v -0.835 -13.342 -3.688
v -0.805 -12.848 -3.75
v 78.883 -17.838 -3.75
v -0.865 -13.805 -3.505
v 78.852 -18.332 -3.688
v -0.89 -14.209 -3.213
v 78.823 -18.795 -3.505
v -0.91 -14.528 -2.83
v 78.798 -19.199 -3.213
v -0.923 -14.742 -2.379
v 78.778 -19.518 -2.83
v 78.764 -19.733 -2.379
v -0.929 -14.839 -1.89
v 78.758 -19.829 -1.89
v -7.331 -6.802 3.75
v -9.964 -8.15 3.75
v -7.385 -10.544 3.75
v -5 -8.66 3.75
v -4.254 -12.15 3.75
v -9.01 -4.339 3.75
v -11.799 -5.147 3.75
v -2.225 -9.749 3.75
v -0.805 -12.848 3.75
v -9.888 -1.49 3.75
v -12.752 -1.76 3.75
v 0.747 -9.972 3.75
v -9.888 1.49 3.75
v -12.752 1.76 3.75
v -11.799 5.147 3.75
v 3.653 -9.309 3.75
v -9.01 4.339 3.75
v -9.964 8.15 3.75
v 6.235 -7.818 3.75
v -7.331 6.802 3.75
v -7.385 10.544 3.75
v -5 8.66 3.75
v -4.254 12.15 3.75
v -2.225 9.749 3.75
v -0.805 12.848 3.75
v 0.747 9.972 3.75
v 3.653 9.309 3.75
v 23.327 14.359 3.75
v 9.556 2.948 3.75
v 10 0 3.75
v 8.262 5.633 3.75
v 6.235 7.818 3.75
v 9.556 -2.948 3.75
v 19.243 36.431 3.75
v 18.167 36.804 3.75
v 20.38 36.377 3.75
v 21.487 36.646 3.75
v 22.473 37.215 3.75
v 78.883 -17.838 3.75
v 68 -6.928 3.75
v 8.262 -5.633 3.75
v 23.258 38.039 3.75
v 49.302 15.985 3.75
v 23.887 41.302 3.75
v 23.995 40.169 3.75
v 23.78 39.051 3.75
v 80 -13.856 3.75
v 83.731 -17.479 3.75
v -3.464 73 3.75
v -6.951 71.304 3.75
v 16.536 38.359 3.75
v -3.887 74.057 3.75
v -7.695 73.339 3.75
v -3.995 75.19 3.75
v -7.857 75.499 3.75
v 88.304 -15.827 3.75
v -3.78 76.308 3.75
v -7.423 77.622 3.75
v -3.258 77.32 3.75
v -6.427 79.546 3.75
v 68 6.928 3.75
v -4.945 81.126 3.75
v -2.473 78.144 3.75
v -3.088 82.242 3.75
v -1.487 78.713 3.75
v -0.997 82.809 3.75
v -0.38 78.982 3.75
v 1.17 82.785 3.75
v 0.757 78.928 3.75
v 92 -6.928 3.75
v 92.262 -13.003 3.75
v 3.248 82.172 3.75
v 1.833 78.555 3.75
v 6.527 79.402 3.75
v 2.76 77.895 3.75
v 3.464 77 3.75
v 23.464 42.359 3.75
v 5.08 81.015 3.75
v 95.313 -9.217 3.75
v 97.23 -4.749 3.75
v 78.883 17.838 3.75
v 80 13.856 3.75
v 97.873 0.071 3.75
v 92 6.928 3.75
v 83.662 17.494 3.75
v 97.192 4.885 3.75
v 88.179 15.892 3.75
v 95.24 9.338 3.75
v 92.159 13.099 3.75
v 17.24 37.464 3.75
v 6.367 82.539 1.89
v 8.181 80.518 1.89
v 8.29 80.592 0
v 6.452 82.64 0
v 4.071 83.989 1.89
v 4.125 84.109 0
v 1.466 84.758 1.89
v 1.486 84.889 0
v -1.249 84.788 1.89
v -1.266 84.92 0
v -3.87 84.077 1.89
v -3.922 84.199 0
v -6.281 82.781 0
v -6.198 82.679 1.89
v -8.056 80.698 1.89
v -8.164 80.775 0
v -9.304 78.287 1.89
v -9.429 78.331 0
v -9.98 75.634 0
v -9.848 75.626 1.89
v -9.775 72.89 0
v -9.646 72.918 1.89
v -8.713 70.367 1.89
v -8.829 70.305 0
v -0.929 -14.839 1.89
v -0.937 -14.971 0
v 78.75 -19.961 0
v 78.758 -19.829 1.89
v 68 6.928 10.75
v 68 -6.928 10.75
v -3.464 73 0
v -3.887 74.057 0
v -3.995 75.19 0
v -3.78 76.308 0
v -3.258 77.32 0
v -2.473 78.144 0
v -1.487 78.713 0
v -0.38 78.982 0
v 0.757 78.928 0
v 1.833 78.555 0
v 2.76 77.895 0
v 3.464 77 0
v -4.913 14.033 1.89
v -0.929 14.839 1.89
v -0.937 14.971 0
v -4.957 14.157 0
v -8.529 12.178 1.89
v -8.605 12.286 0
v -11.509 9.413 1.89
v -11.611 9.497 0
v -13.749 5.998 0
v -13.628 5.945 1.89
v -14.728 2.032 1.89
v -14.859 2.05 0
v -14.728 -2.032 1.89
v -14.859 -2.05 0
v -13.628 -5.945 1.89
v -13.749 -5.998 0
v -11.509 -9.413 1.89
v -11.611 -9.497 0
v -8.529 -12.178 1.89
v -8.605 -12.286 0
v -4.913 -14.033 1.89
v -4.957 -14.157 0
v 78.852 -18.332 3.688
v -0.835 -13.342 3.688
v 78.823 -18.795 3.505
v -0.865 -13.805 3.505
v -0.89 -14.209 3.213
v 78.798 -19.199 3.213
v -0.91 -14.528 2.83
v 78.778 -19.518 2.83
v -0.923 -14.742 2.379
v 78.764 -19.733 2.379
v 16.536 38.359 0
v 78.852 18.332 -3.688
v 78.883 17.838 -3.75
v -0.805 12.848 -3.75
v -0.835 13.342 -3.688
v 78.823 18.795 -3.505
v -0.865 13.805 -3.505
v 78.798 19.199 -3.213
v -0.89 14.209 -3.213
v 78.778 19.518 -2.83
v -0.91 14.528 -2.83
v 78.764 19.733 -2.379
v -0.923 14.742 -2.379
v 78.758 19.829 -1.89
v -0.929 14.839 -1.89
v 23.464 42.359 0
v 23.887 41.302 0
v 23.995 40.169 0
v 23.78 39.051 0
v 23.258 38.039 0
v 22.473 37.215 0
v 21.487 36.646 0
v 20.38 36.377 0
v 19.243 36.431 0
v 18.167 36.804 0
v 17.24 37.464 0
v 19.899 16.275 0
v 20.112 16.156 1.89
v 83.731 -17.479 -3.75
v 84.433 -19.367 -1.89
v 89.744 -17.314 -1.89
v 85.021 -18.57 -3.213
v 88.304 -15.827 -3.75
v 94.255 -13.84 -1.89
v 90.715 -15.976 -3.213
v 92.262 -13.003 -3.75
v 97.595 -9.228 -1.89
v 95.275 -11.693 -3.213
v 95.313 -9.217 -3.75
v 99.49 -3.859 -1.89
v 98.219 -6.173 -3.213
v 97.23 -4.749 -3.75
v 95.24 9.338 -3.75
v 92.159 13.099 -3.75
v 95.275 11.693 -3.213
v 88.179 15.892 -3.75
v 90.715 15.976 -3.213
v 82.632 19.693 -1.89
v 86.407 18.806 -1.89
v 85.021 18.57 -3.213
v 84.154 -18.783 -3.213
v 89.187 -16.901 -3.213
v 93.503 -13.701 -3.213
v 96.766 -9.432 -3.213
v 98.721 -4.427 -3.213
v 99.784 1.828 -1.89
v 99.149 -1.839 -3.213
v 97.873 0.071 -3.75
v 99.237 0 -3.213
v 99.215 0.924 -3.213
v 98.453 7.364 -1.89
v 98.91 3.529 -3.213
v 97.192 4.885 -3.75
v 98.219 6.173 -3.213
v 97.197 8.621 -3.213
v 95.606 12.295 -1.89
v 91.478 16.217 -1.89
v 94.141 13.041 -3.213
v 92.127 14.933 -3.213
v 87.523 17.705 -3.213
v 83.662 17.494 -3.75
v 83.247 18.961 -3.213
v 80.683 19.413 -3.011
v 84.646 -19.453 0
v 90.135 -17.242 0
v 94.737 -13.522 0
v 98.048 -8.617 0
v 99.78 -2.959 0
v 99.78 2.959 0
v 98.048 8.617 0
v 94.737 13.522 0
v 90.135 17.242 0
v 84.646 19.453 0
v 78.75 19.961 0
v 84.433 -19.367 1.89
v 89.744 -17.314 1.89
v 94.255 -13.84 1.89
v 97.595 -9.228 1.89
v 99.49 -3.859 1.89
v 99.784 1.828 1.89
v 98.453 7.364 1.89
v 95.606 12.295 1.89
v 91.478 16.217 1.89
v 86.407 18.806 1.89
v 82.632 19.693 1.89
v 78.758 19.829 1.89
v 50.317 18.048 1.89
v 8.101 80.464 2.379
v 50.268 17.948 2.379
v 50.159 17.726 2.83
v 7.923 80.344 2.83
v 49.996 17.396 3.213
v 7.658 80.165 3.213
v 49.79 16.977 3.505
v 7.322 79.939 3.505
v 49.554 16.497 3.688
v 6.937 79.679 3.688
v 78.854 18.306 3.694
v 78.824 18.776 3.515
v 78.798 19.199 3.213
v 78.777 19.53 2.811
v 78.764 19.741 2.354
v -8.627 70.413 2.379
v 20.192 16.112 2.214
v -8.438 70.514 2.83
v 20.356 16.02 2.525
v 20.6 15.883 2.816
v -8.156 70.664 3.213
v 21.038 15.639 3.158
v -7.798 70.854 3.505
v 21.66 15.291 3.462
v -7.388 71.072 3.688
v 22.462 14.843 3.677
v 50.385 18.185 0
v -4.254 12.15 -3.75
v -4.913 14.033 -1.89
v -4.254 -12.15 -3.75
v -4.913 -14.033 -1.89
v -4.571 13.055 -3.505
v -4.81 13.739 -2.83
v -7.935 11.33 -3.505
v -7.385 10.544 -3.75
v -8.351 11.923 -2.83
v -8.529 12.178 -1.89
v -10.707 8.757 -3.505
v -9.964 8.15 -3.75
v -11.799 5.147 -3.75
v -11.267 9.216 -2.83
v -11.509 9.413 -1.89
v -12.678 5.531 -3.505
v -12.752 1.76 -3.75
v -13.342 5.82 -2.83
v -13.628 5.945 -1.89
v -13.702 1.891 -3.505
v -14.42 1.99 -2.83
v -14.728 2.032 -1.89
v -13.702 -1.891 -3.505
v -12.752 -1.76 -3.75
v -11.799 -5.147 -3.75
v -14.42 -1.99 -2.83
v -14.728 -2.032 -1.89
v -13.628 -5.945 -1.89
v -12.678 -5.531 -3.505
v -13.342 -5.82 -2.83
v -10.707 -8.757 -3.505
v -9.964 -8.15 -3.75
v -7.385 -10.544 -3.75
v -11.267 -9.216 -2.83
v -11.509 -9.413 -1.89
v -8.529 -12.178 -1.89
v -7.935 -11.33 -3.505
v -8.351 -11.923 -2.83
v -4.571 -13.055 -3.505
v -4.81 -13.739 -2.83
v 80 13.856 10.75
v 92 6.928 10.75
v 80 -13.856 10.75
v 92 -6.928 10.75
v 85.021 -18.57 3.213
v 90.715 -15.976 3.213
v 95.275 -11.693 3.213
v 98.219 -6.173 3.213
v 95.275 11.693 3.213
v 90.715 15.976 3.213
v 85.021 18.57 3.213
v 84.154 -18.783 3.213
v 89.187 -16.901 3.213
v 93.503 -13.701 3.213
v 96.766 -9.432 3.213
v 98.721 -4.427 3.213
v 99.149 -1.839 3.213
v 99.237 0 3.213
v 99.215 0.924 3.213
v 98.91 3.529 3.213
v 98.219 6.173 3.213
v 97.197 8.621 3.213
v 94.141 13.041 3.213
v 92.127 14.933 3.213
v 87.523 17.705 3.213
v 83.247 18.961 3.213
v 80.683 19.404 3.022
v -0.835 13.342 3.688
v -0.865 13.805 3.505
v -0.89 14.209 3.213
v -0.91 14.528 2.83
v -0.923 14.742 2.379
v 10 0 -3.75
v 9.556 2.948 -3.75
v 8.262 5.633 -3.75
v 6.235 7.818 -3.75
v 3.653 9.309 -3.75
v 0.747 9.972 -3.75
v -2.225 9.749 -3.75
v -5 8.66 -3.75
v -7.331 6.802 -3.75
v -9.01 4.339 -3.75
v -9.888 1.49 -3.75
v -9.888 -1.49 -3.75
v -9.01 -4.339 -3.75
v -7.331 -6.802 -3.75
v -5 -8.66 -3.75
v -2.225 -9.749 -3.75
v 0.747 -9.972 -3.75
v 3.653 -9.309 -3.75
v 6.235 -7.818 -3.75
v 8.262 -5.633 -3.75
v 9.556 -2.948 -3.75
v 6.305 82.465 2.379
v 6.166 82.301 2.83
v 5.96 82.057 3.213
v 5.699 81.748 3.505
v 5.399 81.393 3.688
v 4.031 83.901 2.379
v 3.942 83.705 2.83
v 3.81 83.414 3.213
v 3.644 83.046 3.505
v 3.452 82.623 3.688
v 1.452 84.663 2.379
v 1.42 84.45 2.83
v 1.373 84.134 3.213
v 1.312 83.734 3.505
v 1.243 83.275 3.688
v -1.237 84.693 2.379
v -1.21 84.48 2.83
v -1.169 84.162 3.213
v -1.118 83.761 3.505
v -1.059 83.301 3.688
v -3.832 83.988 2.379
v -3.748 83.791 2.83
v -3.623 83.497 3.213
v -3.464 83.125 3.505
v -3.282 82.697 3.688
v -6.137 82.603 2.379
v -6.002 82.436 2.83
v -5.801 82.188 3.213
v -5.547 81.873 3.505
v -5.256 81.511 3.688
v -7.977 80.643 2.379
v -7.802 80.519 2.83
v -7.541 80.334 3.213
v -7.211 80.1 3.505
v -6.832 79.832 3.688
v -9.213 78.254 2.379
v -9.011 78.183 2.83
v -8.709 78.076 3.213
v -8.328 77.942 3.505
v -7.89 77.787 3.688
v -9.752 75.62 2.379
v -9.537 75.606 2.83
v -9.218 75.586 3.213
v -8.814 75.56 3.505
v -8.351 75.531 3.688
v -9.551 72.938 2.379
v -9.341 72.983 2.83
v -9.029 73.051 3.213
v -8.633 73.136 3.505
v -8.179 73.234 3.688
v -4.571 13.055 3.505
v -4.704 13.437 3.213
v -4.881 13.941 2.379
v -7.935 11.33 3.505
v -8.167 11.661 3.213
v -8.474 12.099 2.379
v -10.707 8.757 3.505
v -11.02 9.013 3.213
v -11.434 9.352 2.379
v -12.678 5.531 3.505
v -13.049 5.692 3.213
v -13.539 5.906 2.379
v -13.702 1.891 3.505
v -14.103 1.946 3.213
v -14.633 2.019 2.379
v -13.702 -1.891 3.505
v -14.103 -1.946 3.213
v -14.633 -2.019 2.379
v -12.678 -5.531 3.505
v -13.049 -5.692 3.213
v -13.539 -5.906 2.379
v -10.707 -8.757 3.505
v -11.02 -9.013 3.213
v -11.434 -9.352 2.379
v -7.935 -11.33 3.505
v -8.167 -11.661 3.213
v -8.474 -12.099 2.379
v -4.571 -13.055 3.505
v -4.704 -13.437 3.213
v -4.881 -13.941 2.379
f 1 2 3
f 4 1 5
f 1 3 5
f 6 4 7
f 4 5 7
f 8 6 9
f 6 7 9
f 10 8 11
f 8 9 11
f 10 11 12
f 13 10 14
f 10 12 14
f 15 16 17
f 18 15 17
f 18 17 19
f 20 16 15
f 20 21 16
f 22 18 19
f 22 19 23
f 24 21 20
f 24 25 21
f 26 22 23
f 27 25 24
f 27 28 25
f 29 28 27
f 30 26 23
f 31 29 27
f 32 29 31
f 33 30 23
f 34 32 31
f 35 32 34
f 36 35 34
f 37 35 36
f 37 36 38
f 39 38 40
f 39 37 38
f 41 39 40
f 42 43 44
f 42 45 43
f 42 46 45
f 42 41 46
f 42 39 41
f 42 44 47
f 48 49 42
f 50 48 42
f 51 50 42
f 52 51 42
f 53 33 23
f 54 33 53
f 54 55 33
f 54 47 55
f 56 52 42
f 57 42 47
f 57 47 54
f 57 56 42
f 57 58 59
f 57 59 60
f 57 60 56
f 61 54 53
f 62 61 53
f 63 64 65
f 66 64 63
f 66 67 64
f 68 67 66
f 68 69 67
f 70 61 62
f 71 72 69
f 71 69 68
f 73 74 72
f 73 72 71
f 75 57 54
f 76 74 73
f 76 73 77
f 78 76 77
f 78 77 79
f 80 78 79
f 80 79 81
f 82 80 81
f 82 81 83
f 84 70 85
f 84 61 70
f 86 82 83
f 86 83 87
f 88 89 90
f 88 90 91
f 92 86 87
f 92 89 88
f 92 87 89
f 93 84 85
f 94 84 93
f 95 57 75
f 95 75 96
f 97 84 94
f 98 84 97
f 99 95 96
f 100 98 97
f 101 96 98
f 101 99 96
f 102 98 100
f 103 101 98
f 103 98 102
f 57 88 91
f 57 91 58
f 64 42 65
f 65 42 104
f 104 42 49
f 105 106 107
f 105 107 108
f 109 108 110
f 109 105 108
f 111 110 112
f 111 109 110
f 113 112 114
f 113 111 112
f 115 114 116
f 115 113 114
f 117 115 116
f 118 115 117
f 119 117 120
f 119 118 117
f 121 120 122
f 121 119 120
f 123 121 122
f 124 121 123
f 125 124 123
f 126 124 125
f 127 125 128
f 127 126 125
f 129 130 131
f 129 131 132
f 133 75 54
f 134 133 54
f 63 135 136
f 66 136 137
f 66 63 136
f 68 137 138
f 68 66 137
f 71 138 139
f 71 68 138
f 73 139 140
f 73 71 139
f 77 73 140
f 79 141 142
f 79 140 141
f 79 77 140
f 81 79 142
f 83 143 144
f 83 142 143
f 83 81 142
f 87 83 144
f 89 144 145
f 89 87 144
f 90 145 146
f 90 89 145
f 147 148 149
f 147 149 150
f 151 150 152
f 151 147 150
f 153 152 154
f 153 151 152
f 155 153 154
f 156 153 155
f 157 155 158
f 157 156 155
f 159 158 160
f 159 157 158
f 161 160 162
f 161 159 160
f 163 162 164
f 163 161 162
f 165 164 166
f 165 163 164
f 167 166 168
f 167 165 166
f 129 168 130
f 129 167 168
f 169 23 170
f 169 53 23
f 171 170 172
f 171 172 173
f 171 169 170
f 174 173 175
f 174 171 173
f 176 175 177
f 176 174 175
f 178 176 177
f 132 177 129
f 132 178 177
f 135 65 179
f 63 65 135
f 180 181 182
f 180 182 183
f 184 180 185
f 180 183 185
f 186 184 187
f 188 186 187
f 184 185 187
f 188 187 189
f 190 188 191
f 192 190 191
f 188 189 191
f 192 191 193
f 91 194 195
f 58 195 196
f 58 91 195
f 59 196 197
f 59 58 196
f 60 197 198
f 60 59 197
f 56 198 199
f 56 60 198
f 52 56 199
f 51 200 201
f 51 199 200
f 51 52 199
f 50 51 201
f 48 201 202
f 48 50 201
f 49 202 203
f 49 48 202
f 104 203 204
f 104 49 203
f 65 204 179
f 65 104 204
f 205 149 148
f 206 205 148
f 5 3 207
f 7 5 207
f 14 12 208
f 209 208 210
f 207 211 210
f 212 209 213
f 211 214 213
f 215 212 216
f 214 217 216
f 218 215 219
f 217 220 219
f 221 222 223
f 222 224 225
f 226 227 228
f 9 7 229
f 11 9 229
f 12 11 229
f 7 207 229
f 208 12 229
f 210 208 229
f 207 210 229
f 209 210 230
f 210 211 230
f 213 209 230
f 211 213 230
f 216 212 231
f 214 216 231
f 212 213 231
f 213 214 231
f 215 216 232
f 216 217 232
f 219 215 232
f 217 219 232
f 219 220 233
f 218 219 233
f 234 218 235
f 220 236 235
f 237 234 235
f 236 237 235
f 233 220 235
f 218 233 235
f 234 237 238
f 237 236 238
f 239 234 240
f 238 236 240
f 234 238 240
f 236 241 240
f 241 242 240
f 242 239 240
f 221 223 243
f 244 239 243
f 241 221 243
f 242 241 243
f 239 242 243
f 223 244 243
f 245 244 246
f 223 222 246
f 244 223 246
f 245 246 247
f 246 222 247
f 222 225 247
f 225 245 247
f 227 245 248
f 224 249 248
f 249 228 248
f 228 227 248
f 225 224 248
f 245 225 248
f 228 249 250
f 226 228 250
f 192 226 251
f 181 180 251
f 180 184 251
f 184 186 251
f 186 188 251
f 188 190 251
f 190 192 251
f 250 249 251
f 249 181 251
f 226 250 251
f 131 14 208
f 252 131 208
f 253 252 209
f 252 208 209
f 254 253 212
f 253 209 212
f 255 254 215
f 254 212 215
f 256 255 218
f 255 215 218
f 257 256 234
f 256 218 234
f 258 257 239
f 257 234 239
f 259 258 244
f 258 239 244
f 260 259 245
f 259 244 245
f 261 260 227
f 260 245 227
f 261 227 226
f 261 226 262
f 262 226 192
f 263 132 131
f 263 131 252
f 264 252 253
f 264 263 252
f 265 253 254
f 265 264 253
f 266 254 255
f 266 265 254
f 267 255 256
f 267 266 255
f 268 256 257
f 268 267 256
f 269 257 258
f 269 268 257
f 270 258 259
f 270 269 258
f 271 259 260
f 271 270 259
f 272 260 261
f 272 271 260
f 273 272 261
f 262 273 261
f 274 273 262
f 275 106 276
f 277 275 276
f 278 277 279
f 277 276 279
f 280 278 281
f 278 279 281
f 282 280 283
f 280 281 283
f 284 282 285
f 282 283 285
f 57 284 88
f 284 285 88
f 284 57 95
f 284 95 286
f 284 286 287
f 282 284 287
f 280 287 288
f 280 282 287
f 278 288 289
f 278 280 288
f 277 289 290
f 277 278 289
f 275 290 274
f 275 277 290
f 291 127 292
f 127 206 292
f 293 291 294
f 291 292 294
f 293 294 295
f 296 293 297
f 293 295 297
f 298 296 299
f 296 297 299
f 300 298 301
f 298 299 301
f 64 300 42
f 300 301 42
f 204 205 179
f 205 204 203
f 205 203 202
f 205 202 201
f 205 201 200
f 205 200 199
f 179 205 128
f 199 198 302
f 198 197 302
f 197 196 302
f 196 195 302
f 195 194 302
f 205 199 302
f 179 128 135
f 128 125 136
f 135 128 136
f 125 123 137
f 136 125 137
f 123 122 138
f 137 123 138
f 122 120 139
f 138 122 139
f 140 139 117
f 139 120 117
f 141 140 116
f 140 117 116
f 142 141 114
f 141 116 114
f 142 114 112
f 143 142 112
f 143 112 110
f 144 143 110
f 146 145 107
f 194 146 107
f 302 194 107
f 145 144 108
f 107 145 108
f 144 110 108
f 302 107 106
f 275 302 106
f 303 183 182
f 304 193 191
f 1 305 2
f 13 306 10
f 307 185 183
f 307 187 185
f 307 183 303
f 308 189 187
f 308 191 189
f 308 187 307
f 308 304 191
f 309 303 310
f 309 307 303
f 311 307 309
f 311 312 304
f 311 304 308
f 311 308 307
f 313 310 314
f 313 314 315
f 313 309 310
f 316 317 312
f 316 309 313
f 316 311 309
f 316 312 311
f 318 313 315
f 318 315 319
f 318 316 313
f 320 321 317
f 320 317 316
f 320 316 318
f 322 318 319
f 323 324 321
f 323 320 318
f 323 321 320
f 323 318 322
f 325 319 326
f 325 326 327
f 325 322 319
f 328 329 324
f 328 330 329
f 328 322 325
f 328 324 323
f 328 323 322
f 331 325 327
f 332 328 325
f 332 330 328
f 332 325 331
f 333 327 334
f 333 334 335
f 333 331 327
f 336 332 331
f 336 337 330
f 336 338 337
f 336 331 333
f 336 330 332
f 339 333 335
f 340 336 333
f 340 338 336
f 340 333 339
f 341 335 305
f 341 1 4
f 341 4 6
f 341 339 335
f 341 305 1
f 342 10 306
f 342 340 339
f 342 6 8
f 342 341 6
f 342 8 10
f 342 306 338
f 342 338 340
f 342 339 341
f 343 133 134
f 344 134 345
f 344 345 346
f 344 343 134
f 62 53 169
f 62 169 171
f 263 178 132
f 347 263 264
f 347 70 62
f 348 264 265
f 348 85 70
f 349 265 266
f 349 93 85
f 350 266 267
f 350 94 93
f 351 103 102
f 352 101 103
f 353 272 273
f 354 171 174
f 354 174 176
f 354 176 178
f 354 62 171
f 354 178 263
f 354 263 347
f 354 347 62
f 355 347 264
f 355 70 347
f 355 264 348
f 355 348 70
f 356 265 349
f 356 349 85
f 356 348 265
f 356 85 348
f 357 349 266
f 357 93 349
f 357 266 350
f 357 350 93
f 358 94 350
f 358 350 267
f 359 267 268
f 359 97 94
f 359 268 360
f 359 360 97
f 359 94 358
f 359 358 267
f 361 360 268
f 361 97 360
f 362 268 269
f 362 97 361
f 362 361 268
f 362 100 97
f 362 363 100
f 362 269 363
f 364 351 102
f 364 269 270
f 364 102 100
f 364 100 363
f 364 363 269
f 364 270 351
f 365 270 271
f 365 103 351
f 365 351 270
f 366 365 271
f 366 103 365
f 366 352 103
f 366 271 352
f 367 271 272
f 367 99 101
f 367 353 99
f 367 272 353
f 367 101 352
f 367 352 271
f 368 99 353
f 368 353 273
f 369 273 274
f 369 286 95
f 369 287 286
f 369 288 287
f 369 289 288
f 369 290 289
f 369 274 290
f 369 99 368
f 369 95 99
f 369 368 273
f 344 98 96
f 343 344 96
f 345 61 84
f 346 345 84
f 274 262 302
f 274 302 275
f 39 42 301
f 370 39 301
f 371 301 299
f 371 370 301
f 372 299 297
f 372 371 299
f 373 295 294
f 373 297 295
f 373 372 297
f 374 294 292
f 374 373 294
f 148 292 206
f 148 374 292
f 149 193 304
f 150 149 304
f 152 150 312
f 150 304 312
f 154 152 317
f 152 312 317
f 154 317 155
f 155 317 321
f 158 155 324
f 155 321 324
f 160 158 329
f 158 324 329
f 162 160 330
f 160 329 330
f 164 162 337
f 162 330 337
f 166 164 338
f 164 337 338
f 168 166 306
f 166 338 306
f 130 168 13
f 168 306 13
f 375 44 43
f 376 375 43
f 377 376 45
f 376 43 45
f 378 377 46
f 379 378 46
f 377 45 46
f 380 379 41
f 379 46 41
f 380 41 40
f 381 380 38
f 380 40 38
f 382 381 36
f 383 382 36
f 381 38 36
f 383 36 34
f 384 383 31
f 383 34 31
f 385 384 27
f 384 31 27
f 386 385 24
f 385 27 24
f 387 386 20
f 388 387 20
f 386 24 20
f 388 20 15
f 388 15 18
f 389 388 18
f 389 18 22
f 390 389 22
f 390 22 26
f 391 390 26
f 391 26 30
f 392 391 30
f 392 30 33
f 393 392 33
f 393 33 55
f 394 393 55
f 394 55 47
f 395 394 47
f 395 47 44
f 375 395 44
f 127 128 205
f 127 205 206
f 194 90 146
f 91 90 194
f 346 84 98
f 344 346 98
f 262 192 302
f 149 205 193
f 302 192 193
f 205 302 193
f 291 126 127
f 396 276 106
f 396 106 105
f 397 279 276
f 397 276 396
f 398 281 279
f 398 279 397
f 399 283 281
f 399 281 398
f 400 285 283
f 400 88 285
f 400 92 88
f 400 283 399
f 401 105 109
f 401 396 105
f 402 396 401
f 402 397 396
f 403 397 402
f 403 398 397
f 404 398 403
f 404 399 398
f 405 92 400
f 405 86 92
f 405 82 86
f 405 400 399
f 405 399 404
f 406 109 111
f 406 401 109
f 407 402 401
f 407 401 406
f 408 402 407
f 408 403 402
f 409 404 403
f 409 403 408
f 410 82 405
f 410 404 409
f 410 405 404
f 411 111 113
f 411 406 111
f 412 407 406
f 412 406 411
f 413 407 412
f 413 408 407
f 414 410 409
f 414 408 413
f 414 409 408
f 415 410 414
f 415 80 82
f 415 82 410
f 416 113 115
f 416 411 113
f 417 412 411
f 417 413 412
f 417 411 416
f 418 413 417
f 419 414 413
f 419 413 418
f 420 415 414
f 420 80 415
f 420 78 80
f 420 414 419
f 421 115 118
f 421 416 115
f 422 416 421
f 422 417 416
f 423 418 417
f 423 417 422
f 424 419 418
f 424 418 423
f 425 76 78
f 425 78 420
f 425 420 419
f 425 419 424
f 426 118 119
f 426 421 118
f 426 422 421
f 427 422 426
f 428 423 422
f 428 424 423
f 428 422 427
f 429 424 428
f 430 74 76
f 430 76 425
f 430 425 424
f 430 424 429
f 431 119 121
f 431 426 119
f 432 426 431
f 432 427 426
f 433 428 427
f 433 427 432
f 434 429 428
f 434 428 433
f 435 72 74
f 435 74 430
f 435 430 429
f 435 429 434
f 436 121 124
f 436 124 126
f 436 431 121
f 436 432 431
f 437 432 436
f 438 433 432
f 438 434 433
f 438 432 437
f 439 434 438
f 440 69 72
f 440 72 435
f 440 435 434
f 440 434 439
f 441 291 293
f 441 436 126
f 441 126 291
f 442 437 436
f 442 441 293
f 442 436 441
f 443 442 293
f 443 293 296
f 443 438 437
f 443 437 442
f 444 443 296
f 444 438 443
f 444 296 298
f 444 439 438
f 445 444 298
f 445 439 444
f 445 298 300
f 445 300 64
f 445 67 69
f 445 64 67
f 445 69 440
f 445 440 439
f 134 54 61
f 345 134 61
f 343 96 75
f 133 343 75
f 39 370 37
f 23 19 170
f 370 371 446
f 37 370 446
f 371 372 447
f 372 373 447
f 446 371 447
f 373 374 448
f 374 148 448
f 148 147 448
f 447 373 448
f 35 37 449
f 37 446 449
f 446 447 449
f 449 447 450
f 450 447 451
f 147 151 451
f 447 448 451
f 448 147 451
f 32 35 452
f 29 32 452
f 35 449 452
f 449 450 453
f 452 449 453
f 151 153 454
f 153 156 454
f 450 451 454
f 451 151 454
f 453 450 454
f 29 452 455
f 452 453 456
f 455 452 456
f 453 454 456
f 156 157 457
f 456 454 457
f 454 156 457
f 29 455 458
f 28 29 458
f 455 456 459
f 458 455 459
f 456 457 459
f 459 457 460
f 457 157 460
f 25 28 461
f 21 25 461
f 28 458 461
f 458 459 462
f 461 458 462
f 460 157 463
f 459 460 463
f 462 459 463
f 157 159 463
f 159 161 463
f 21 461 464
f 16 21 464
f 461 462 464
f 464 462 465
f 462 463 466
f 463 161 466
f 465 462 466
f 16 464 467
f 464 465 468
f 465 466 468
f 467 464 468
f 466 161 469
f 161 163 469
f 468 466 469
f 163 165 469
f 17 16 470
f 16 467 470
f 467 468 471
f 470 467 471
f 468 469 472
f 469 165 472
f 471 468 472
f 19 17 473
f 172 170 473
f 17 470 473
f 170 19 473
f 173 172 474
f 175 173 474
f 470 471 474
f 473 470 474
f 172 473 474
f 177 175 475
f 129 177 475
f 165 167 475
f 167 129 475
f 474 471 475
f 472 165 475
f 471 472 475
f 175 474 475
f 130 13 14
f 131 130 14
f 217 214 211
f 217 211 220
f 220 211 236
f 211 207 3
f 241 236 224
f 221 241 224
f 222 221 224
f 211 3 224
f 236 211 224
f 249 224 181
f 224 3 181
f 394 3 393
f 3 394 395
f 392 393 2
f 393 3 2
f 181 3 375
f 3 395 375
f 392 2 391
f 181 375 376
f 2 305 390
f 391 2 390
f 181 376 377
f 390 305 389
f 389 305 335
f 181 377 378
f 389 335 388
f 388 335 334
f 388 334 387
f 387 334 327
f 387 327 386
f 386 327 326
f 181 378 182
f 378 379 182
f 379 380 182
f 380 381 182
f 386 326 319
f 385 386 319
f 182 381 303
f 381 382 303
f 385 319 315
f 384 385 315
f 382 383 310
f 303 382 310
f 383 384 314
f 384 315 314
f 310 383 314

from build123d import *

# Parameters (mm, degrees)
EXTRUDE_366_DEPTH           = 3.75
EXTRUDE_366_TAPER           = 4.000000000000009
EXTRUDE_366_OTHER_WAY_DEPTH = 3.75
EXTRUDE_366_OTHER_WAY_TAPER = 4.000000000000009
EXTRUDE_746_DEPTH           = 3.75
EXTRUDE_746_TAPER           = 4.000000000000009
CUT_EXTRUDE_1239_DEPTH      = 10
SKETCH_4_R                  = 10
CUT_EXTRUDE_1_DEPTH         = 10
EXTRUDE_1783_DEPTH          = 7
FILLET_2_R                  = 2
FILLET_3_R                  = 2


with BuildPart() as part:
    # Эскиз1 → Extrude 366 (new body)
    with BuildSketch(Plane.XY):
        with BuildLine():
            ThreePointArc((-0.9374999999999997, 14.970674458754353), (-15.000000000000044, 1.84e-15), (-0.9374999999999997, -14.970674458754353))
            Line((-0.9374999999999997, -14.970674458754353), (78.75, -19.960899278339134))
            ThreePointArc((78.75, -19.960899278339134), (100, 0), (78.75, 19.960899278339134))
            Line((78.75, 19.960899278339134), (-0.9374999999999997, 14.970674458754353))
        make_face()
    extrude(amount=EXTRUDE_366_DEPTH, taper=EXTRUDE_366_TAPER)

    # Эскиз1 → Extrude 366 other way (add)
    with BuildSketch(Plane.XY):
        with BuildLine():
            ThreePointArc((-0.9374999999999997, 14.970674458754353), (-15.000000000000044, 1.84e-15), (-0.9374999999999997, -14.970674458754353))
            Line((-0.9374999999999997, -14.970674458754353), (78.75, -19.960899278339134))
            ThreePointArc((78.75, -19.960899278339134), (100, 0), (78.75, 19.960899278339134))
            Line((78.75, 19.960899278339134), (-0.9374999999999997, 14.970674458754353))
        make_face()
    extrude(amount=-EXTRUDE_366_OTHER_WAY_DEPTH, taper=EXTRUDE_366_OTHER_WAY_TAPER)

    # Эскиз2 → Extrude 746 (add)
    with BuildSketch(Plane.XY):
        with BuildLine():
            Line((-8.829475928589163, 70.3052843721409), (28.552506867722524, 0))
            Line((28.552506867722524, 0), (62.650318248221396, 1.896e-14))
            Line((62.650318248221396, 1.896e-14), (8.2903757255504, 80.59192903470749))
            ThreePointArc((8.2903757255504, 80.59192903470749), (-5.150380749100648, 83.57167300702106), (-8.829475928589163, 70.3052843721409))
        make_face()
    extrude(amount=EXTRUDE_746_DEPTH, taper=EXTRUDE_746_TAPER)

    # Эскиз3 → Cut-Extrude 1239 (cut)
    with BuildSketch(Plane.XY.offset(3.75)):
        with BuildLine():
            Line((3.464101615137748, 77.00000000000001), (23.464101615137906, 42.35898384862258))
            ThreePointArc((23.464101615137906, 42.35898384862258), (22.00000000000019, 36.89488223348481), (16.53589838486241, 38.358983848622536))
            Line((16.53589838486241, 38.358983848622536), (-3.464101615137746, 72.99999999999997))
            ThreePointArc((-3.464101615137746, 72.99999999999997), (-2.00000000000002, 78.46410161513775), (3.464101615137748, 77.00000000000001))
        make_face()
    extrude(amount=-CUT_EXTRUDE_1239_DEPTH, mode=Mode.SUBTRACT)

    # Эскиз4 → отверстие1 (cut)
    with BuildSketch(Plane.XY.offset(3.75)):
        Circle(SKETCH_4_R)
    extrude(amount=-CUT_EXTRUDE_1_DEPTH, mode=Mode.SUBTRACT)

    # Эскиз5 → Extrude 1783 (add)
    with BuildSketch(Plane.XY.offset(3.75)):
        Polygon((79.99999999999999, 13.856406460551018), (68, 6.928203230275526), (68, -6.9282032302754955), (80, -13.856406460551012), (92, -6.928203230275516), (92, 6.928203230275502), align=None)
    extrude(amount=EXTRUDE_1783_DEPTH)

    # Скругление2
    fillet_2_edges = [part.edges().sort_by_distance(p)[0] for p in [
        (99.73777445521183, -1.332e-14, -3.75),
        (99.73777445521183, -3.77e-15, 3.7499999999999996),
        (9.700092064405581, 15.374087104269854, 3.7499999999999987),
        (-14.737774455211877, -5.44e-15, 3.7499999999999996),
        (38.922639096549254, -17.204073984160544, 3.750000000000001),
        (38.922639096549226, 17.20407398416053, -3.75),
        (64.50880005583919, 18.806341534992715, 3.7499999999999996),
        (-14.737774455211884, -4.44e-15, -3.75),
        (38.92263909654925, -17.204073984160534, -3.75),
    ]]
    fillet(fillet_2_edges, radius=FILLET_2_R)

    # Скругление3
    fillet_3_edges = [part.edges().sort_by_distance(p)[0] for p in [
        (6.342464766178029, 42.32956867017836, 3.7500000000000004),
        (-5.0153246093207, 83.34690184461985, 3.7499999999999996),
        (29.766776124769358, 48.282920306520026, 3.7499999999999885),
    ]]
    fillet(fillet_3_edges, radius=FILLET_3_R)


solid = part.part
